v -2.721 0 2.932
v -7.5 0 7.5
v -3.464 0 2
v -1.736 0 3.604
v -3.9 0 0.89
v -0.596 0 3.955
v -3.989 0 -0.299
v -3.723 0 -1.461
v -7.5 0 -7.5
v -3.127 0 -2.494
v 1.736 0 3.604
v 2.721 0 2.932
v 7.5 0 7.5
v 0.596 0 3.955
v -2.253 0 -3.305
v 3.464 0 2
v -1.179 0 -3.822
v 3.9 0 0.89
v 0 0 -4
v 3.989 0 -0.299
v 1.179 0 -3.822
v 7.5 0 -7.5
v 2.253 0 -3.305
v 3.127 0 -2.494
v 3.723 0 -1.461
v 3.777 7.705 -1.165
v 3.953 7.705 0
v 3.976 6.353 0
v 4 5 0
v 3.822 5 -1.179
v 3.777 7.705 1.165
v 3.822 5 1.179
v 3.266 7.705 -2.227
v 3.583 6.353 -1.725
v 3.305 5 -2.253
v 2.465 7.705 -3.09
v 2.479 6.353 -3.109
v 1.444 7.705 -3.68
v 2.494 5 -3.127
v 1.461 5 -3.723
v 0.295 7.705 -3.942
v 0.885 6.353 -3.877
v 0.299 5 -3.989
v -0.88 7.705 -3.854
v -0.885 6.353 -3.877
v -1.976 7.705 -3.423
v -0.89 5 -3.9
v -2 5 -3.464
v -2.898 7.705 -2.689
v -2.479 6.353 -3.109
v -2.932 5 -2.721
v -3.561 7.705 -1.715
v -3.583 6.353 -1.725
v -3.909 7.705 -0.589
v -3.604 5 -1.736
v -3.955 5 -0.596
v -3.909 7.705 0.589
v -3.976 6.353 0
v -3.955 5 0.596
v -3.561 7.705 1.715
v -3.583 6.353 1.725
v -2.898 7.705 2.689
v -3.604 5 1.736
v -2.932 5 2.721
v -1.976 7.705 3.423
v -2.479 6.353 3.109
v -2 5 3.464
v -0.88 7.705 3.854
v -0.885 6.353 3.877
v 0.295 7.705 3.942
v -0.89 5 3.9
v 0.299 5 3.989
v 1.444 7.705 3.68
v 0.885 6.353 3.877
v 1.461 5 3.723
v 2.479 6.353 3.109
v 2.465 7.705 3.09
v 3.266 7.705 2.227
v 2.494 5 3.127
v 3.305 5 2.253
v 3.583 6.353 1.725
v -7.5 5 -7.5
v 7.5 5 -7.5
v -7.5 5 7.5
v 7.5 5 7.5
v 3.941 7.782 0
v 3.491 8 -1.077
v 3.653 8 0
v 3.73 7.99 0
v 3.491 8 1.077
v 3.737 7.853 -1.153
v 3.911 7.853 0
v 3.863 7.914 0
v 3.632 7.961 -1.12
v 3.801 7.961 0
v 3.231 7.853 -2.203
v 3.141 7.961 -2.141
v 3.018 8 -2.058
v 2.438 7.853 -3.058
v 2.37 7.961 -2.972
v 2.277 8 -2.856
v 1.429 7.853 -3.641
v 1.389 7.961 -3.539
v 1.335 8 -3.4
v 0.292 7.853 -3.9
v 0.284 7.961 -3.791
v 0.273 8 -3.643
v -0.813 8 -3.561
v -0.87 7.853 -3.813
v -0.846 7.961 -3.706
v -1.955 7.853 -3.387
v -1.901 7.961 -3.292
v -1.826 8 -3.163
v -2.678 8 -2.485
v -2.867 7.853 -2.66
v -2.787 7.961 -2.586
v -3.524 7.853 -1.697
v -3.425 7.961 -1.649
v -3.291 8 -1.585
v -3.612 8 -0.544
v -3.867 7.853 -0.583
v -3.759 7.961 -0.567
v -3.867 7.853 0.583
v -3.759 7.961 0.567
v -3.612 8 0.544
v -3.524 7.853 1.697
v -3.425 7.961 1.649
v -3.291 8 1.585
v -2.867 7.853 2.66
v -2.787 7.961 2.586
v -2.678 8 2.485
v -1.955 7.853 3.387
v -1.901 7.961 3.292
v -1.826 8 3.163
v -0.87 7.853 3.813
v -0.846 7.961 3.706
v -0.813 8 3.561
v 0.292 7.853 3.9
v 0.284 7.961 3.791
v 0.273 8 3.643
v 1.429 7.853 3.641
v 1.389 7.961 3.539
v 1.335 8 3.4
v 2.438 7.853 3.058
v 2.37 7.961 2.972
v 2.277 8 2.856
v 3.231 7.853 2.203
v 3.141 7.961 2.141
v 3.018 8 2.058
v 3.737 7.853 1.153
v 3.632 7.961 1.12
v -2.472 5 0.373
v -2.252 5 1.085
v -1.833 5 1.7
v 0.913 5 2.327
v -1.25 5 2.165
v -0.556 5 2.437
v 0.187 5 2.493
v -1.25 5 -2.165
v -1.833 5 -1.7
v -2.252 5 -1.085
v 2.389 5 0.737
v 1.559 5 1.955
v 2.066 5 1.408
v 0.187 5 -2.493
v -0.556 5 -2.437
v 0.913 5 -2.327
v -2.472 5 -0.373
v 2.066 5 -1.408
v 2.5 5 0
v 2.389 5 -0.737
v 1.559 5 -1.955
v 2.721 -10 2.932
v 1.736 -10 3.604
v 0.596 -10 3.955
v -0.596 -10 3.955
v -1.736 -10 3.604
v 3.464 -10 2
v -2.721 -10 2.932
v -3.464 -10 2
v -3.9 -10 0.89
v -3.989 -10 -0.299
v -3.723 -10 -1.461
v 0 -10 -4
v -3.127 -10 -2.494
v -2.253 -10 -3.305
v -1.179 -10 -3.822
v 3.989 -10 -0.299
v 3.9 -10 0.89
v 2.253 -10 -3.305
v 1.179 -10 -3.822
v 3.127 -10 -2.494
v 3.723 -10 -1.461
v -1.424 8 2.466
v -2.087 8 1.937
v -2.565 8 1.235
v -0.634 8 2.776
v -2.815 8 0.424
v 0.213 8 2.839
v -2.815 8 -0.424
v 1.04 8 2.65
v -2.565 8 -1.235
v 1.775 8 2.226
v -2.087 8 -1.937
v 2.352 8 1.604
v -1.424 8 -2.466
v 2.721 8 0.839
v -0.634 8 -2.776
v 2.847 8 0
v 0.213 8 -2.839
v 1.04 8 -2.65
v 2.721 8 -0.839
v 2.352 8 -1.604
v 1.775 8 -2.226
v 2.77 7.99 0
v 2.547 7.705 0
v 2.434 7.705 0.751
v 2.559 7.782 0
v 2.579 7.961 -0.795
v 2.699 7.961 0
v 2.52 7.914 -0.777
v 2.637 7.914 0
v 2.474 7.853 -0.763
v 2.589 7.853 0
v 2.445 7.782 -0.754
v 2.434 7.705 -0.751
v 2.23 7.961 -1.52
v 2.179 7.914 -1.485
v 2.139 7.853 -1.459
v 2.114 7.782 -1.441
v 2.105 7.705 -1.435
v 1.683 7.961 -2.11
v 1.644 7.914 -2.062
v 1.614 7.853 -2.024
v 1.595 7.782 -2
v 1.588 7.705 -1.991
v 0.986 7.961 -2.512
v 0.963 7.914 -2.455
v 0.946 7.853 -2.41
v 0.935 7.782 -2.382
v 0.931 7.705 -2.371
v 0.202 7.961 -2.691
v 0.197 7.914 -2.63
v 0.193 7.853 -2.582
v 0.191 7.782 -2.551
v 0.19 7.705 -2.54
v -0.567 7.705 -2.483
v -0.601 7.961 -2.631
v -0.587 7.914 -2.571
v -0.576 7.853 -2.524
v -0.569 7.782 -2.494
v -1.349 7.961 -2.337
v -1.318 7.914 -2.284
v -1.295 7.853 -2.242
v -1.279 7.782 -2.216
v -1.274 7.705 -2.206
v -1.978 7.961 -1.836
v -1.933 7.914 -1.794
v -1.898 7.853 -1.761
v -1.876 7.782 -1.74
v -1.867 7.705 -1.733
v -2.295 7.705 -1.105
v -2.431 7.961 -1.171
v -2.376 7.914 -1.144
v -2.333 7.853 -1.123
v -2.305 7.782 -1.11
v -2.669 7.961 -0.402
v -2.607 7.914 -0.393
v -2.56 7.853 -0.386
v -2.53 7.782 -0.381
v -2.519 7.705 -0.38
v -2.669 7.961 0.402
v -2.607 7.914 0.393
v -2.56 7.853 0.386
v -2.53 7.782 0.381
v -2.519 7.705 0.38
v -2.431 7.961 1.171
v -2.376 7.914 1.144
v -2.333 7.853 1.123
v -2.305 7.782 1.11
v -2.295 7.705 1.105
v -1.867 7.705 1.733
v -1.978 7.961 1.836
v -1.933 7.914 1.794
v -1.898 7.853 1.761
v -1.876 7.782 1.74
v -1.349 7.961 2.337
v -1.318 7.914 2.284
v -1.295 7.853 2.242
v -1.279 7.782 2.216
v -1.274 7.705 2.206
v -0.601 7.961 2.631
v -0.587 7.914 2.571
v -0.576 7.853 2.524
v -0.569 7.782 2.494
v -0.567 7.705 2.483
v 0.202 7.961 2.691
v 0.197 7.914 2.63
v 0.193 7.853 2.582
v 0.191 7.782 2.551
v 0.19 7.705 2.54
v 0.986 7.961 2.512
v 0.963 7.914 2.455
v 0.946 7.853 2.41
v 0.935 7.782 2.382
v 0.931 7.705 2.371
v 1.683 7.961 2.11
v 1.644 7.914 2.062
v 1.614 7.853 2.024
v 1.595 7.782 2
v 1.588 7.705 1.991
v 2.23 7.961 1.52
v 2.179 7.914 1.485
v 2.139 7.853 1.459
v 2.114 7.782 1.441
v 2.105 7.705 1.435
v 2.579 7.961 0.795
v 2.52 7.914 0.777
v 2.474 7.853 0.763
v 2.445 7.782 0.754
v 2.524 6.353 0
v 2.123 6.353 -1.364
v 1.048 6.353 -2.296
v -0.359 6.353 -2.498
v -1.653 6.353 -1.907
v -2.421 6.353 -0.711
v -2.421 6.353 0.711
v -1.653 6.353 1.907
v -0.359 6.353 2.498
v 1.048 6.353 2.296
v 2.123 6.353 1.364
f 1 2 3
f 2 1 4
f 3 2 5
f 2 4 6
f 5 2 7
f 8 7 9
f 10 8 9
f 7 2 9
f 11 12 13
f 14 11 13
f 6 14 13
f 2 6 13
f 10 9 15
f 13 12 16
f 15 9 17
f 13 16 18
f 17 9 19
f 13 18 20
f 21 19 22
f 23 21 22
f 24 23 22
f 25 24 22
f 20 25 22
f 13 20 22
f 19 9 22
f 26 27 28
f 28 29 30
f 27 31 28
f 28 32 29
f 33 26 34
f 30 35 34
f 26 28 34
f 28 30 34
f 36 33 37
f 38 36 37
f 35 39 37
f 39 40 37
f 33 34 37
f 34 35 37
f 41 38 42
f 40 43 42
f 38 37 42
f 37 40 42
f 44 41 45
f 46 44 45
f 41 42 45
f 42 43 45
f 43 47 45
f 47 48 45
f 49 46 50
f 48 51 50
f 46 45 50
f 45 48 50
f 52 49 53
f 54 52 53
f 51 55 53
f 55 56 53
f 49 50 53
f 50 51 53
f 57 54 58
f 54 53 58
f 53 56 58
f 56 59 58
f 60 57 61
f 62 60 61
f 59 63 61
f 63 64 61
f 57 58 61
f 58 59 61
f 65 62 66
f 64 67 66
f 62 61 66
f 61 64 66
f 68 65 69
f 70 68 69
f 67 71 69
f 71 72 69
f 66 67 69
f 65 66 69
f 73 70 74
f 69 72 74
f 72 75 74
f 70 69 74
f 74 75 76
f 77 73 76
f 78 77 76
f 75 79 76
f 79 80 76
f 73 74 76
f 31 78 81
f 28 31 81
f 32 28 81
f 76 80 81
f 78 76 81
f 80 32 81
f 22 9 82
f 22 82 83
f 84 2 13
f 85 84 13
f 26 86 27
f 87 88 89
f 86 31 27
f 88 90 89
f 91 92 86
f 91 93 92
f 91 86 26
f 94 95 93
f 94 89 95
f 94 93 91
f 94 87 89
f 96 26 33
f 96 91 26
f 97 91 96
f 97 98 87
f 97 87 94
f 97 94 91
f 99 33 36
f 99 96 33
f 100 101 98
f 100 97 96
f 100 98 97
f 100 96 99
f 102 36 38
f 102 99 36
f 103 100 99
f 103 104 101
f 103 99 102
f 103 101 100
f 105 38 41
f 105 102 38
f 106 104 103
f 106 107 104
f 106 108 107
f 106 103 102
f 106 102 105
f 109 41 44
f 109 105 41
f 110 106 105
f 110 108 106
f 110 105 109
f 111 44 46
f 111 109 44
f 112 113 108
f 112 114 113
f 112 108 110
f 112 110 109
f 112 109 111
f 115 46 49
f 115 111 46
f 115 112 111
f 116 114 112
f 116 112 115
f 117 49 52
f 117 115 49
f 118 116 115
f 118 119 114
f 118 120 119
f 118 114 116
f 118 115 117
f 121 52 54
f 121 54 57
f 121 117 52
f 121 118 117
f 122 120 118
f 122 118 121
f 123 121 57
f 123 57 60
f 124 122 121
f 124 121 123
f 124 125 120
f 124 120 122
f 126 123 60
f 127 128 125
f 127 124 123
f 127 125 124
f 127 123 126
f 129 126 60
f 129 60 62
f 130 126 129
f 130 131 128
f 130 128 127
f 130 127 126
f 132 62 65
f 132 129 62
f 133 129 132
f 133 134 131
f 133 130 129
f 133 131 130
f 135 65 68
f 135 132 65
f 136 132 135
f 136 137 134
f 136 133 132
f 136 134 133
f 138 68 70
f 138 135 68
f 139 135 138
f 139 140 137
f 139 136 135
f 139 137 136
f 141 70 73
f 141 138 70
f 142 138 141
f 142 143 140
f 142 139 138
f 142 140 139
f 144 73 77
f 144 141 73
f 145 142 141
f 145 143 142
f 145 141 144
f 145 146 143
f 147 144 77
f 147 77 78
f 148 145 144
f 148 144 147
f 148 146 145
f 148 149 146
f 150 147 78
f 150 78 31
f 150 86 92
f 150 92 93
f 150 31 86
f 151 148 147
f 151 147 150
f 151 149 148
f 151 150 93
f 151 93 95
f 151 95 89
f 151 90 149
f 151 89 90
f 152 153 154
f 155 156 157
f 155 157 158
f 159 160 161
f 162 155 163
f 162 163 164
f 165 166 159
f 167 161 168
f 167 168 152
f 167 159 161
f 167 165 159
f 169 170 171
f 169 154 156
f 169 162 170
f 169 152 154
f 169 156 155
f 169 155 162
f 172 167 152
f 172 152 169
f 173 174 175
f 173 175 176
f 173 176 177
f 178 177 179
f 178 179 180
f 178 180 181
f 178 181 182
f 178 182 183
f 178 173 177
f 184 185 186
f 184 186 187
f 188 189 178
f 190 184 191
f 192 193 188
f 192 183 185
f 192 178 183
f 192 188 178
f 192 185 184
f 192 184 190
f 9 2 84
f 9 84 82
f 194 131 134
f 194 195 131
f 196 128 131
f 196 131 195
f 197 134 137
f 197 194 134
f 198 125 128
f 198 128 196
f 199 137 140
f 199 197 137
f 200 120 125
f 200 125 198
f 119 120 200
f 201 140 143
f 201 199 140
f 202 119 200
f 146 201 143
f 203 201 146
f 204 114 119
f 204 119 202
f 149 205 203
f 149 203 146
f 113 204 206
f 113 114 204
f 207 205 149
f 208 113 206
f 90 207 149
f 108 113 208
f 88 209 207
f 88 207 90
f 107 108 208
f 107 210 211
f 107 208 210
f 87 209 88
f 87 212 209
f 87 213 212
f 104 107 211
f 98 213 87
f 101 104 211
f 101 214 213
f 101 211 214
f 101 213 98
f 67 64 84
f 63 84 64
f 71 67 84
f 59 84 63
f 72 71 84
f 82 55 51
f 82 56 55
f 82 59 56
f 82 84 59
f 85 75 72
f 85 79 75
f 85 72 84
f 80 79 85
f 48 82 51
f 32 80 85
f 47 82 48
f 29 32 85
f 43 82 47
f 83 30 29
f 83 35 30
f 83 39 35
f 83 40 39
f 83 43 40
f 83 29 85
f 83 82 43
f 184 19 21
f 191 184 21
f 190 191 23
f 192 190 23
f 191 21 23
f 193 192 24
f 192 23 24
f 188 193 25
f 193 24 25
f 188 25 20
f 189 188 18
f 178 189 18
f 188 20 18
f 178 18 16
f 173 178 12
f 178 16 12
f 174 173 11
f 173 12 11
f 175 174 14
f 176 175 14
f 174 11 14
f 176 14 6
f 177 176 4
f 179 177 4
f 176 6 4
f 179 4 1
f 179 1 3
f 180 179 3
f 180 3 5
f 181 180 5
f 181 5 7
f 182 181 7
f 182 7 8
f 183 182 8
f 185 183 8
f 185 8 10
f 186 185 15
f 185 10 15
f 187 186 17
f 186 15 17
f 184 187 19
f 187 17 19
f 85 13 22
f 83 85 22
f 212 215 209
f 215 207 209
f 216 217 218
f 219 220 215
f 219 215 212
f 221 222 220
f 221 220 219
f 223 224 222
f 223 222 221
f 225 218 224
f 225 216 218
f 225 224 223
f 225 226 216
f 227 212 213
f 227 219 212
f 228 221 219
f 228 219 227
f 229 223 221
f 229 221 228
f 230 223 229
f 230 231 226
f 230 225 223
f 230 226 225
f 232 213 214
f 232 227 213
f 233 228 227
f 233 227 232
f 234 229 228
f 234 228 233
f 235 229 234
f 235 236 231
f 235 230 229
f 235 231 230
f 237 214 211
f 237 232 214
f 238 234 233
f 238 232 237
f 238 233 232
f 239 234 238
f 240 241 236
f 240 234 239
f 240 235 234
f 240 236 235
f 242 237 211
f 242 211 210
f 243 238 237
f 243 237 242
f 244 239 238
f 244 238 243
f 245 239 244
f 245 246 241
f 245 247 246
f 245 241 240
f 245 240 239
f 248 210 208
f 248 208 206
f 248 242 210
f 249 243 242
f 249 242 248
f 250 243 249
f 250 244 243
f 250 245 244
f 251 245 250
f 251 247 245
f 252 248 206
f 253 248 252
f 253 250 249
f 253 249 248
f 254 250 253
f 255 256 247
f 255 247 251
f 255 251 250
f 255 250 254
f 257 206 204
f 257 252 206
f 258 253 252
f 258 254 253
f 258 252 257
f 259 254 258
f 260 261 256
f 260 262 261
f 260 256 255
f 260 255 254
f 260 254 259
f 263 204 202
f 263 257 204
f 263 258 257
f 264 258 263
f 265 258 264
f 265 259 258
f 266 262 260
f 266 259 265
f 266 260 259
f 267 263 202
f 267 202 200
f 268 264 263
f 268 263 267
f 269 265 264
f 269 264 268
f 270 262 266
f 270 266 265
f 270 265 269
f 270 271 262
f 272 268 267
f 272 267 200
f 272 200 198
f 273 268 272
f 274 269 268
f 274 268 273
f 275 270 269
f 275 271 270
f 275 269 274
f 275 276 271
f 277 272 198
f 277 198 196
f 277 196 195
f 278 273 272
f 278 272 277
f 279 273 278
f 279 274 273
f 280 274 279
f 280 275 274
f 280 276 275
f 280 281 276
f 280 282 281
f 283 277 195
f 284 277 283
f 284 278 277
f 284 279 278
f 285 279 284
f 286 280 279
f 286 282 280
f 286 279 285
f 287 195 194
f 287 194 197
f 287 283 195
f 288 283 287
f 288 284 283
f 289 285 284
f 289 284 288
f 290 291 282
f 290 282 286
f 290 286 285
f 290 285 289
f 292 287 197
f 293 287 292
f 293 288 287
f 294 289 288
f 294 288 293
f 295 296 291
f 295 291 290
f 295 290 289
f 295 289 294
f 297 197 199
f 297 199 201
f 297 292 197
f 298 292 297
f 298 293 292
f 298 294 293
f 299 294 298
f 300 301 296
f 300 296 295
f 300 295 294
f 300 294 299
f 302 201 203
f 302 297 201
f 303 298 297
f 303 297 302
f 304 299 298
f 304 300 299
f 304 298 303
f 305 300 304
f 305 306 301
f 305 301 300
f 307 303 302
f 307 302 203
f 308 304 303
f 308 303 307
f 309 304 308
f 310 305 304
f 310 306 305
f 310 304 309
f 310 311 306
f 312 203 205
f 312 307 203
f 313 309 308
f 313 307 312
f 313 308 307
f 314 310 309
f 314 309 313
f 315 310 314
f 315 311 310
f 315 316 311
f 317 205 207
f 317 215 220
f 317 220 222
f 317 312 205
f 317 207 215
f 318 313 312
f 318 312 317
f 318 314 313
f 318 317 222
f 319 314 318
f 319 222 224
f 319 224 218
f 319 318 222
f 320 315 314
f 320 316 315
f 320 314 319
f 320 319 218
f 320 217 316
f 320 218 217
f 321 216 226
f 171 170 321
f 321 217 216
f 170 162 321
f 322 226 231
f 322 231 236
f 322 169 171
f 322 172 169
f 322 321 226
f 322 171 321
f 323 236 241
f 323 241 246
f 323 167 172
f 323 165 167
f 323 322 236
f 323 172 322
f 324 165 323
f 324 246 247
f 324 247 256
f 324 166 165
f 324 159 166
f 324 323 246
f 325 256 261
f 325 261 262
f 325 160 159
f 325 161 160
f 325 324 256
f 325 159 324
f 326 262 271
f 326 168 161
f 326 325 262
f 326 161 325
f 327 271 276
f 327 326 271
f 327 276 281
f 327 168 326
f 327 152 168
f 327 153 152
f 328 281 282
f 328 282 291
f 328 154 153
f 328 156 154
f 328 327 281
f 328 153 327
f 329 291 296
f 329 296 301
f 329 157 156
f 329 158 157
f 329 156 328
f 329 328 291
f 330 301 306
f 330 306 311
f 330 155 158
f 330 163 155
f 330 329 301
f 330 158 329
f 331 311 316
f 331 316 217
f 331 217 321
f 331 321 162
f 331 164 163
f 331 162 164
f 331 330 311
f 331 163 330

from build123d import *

# Parameters (mm, degrees)
SKETCH1_W           = 15
SKETCH1_H           = 15
BOSS_EXTRUDE1_DEPTH = 5
SKETCH2_R           = 4
SKETCH2_R_2         = 2.5
BOSS_EXTRUDE2_DEPTH = 3
BOSS_EXTRUDE2_DRAFT = 1
FILLET1_R           = 0.3
SKETCH3_R           = 4
BOSS_EXTRUDE3_DEPTH = 10


with BuildPart() as part:
    # Sketch1 → Boss-Extrude1 (new body)
    with BuildSketch(Plane(origin=(0, 0, 0), x_dir=(1, 0, 0), z_dir=(0, 1, 0))):
        Rectangle(SKETCH1_W, SKETCH1_H)
    extrude(amount=BOSS_EXTRUDE1_DEPTH)


with BuildPart() as boss_extrude2_tool:
    # Sketch2 → Boss-Extrude2 (with draft: the straight prism first)
    with BuildSketch(Plane(origin=(0, 5, 0), x_dir=(1, 0, 0), z_dir=(0, 1, 0))):
        Circle(SKETCH2_R)
        Circle(SKETCH2_R_2, mode=Mode.SUBTRACT)
    extrude(amount=BOSS_EXTRUDE2_DEPTH)
    # Boss-Extrude2: the draft: its side faces are tilted about the plane it starts from
    boss_extrude2_sides = [boss_extrude2_tool.faces().sort_by_distance(p)[0] for p in [
        (-4, 6.5, 0),
        (-2.5, 6.5, 0),
    ]]
    draft(boss_extrude2_sides, Plane(origin=(0, 5, 0), x_dir=(1, 0, 0), z_dir=(0, 1, 0)), BOSS_EXTRUDE2_DRAFT)


with BuildPart() as part_1:
    add(part.part)

    # Boss-Extrude2: add boss_extrude2_tool
    add(boss_extrude2_tool.part)

    # Fillet1
    fillet1_edges = [part_1.edges().sort_by_distance(p)[0] for p in [
        (-3.947634805, 8, 0),
        (-2.552365195, 8, 0),
    ]]
    fillet(fillet1_edges, radius=FILLET1_R)

    # Sketch3 → Boss-Extrude3 (add)
    with BuildSketch(Plane.XZ):
        with Locations(Location((0, 0, 0), (0, 0, 270))):
            Circle(SKETCH3_R)
    extrude(amount=BOSS_EXTRUDE3_DEPTH)


solid = part_1.part
